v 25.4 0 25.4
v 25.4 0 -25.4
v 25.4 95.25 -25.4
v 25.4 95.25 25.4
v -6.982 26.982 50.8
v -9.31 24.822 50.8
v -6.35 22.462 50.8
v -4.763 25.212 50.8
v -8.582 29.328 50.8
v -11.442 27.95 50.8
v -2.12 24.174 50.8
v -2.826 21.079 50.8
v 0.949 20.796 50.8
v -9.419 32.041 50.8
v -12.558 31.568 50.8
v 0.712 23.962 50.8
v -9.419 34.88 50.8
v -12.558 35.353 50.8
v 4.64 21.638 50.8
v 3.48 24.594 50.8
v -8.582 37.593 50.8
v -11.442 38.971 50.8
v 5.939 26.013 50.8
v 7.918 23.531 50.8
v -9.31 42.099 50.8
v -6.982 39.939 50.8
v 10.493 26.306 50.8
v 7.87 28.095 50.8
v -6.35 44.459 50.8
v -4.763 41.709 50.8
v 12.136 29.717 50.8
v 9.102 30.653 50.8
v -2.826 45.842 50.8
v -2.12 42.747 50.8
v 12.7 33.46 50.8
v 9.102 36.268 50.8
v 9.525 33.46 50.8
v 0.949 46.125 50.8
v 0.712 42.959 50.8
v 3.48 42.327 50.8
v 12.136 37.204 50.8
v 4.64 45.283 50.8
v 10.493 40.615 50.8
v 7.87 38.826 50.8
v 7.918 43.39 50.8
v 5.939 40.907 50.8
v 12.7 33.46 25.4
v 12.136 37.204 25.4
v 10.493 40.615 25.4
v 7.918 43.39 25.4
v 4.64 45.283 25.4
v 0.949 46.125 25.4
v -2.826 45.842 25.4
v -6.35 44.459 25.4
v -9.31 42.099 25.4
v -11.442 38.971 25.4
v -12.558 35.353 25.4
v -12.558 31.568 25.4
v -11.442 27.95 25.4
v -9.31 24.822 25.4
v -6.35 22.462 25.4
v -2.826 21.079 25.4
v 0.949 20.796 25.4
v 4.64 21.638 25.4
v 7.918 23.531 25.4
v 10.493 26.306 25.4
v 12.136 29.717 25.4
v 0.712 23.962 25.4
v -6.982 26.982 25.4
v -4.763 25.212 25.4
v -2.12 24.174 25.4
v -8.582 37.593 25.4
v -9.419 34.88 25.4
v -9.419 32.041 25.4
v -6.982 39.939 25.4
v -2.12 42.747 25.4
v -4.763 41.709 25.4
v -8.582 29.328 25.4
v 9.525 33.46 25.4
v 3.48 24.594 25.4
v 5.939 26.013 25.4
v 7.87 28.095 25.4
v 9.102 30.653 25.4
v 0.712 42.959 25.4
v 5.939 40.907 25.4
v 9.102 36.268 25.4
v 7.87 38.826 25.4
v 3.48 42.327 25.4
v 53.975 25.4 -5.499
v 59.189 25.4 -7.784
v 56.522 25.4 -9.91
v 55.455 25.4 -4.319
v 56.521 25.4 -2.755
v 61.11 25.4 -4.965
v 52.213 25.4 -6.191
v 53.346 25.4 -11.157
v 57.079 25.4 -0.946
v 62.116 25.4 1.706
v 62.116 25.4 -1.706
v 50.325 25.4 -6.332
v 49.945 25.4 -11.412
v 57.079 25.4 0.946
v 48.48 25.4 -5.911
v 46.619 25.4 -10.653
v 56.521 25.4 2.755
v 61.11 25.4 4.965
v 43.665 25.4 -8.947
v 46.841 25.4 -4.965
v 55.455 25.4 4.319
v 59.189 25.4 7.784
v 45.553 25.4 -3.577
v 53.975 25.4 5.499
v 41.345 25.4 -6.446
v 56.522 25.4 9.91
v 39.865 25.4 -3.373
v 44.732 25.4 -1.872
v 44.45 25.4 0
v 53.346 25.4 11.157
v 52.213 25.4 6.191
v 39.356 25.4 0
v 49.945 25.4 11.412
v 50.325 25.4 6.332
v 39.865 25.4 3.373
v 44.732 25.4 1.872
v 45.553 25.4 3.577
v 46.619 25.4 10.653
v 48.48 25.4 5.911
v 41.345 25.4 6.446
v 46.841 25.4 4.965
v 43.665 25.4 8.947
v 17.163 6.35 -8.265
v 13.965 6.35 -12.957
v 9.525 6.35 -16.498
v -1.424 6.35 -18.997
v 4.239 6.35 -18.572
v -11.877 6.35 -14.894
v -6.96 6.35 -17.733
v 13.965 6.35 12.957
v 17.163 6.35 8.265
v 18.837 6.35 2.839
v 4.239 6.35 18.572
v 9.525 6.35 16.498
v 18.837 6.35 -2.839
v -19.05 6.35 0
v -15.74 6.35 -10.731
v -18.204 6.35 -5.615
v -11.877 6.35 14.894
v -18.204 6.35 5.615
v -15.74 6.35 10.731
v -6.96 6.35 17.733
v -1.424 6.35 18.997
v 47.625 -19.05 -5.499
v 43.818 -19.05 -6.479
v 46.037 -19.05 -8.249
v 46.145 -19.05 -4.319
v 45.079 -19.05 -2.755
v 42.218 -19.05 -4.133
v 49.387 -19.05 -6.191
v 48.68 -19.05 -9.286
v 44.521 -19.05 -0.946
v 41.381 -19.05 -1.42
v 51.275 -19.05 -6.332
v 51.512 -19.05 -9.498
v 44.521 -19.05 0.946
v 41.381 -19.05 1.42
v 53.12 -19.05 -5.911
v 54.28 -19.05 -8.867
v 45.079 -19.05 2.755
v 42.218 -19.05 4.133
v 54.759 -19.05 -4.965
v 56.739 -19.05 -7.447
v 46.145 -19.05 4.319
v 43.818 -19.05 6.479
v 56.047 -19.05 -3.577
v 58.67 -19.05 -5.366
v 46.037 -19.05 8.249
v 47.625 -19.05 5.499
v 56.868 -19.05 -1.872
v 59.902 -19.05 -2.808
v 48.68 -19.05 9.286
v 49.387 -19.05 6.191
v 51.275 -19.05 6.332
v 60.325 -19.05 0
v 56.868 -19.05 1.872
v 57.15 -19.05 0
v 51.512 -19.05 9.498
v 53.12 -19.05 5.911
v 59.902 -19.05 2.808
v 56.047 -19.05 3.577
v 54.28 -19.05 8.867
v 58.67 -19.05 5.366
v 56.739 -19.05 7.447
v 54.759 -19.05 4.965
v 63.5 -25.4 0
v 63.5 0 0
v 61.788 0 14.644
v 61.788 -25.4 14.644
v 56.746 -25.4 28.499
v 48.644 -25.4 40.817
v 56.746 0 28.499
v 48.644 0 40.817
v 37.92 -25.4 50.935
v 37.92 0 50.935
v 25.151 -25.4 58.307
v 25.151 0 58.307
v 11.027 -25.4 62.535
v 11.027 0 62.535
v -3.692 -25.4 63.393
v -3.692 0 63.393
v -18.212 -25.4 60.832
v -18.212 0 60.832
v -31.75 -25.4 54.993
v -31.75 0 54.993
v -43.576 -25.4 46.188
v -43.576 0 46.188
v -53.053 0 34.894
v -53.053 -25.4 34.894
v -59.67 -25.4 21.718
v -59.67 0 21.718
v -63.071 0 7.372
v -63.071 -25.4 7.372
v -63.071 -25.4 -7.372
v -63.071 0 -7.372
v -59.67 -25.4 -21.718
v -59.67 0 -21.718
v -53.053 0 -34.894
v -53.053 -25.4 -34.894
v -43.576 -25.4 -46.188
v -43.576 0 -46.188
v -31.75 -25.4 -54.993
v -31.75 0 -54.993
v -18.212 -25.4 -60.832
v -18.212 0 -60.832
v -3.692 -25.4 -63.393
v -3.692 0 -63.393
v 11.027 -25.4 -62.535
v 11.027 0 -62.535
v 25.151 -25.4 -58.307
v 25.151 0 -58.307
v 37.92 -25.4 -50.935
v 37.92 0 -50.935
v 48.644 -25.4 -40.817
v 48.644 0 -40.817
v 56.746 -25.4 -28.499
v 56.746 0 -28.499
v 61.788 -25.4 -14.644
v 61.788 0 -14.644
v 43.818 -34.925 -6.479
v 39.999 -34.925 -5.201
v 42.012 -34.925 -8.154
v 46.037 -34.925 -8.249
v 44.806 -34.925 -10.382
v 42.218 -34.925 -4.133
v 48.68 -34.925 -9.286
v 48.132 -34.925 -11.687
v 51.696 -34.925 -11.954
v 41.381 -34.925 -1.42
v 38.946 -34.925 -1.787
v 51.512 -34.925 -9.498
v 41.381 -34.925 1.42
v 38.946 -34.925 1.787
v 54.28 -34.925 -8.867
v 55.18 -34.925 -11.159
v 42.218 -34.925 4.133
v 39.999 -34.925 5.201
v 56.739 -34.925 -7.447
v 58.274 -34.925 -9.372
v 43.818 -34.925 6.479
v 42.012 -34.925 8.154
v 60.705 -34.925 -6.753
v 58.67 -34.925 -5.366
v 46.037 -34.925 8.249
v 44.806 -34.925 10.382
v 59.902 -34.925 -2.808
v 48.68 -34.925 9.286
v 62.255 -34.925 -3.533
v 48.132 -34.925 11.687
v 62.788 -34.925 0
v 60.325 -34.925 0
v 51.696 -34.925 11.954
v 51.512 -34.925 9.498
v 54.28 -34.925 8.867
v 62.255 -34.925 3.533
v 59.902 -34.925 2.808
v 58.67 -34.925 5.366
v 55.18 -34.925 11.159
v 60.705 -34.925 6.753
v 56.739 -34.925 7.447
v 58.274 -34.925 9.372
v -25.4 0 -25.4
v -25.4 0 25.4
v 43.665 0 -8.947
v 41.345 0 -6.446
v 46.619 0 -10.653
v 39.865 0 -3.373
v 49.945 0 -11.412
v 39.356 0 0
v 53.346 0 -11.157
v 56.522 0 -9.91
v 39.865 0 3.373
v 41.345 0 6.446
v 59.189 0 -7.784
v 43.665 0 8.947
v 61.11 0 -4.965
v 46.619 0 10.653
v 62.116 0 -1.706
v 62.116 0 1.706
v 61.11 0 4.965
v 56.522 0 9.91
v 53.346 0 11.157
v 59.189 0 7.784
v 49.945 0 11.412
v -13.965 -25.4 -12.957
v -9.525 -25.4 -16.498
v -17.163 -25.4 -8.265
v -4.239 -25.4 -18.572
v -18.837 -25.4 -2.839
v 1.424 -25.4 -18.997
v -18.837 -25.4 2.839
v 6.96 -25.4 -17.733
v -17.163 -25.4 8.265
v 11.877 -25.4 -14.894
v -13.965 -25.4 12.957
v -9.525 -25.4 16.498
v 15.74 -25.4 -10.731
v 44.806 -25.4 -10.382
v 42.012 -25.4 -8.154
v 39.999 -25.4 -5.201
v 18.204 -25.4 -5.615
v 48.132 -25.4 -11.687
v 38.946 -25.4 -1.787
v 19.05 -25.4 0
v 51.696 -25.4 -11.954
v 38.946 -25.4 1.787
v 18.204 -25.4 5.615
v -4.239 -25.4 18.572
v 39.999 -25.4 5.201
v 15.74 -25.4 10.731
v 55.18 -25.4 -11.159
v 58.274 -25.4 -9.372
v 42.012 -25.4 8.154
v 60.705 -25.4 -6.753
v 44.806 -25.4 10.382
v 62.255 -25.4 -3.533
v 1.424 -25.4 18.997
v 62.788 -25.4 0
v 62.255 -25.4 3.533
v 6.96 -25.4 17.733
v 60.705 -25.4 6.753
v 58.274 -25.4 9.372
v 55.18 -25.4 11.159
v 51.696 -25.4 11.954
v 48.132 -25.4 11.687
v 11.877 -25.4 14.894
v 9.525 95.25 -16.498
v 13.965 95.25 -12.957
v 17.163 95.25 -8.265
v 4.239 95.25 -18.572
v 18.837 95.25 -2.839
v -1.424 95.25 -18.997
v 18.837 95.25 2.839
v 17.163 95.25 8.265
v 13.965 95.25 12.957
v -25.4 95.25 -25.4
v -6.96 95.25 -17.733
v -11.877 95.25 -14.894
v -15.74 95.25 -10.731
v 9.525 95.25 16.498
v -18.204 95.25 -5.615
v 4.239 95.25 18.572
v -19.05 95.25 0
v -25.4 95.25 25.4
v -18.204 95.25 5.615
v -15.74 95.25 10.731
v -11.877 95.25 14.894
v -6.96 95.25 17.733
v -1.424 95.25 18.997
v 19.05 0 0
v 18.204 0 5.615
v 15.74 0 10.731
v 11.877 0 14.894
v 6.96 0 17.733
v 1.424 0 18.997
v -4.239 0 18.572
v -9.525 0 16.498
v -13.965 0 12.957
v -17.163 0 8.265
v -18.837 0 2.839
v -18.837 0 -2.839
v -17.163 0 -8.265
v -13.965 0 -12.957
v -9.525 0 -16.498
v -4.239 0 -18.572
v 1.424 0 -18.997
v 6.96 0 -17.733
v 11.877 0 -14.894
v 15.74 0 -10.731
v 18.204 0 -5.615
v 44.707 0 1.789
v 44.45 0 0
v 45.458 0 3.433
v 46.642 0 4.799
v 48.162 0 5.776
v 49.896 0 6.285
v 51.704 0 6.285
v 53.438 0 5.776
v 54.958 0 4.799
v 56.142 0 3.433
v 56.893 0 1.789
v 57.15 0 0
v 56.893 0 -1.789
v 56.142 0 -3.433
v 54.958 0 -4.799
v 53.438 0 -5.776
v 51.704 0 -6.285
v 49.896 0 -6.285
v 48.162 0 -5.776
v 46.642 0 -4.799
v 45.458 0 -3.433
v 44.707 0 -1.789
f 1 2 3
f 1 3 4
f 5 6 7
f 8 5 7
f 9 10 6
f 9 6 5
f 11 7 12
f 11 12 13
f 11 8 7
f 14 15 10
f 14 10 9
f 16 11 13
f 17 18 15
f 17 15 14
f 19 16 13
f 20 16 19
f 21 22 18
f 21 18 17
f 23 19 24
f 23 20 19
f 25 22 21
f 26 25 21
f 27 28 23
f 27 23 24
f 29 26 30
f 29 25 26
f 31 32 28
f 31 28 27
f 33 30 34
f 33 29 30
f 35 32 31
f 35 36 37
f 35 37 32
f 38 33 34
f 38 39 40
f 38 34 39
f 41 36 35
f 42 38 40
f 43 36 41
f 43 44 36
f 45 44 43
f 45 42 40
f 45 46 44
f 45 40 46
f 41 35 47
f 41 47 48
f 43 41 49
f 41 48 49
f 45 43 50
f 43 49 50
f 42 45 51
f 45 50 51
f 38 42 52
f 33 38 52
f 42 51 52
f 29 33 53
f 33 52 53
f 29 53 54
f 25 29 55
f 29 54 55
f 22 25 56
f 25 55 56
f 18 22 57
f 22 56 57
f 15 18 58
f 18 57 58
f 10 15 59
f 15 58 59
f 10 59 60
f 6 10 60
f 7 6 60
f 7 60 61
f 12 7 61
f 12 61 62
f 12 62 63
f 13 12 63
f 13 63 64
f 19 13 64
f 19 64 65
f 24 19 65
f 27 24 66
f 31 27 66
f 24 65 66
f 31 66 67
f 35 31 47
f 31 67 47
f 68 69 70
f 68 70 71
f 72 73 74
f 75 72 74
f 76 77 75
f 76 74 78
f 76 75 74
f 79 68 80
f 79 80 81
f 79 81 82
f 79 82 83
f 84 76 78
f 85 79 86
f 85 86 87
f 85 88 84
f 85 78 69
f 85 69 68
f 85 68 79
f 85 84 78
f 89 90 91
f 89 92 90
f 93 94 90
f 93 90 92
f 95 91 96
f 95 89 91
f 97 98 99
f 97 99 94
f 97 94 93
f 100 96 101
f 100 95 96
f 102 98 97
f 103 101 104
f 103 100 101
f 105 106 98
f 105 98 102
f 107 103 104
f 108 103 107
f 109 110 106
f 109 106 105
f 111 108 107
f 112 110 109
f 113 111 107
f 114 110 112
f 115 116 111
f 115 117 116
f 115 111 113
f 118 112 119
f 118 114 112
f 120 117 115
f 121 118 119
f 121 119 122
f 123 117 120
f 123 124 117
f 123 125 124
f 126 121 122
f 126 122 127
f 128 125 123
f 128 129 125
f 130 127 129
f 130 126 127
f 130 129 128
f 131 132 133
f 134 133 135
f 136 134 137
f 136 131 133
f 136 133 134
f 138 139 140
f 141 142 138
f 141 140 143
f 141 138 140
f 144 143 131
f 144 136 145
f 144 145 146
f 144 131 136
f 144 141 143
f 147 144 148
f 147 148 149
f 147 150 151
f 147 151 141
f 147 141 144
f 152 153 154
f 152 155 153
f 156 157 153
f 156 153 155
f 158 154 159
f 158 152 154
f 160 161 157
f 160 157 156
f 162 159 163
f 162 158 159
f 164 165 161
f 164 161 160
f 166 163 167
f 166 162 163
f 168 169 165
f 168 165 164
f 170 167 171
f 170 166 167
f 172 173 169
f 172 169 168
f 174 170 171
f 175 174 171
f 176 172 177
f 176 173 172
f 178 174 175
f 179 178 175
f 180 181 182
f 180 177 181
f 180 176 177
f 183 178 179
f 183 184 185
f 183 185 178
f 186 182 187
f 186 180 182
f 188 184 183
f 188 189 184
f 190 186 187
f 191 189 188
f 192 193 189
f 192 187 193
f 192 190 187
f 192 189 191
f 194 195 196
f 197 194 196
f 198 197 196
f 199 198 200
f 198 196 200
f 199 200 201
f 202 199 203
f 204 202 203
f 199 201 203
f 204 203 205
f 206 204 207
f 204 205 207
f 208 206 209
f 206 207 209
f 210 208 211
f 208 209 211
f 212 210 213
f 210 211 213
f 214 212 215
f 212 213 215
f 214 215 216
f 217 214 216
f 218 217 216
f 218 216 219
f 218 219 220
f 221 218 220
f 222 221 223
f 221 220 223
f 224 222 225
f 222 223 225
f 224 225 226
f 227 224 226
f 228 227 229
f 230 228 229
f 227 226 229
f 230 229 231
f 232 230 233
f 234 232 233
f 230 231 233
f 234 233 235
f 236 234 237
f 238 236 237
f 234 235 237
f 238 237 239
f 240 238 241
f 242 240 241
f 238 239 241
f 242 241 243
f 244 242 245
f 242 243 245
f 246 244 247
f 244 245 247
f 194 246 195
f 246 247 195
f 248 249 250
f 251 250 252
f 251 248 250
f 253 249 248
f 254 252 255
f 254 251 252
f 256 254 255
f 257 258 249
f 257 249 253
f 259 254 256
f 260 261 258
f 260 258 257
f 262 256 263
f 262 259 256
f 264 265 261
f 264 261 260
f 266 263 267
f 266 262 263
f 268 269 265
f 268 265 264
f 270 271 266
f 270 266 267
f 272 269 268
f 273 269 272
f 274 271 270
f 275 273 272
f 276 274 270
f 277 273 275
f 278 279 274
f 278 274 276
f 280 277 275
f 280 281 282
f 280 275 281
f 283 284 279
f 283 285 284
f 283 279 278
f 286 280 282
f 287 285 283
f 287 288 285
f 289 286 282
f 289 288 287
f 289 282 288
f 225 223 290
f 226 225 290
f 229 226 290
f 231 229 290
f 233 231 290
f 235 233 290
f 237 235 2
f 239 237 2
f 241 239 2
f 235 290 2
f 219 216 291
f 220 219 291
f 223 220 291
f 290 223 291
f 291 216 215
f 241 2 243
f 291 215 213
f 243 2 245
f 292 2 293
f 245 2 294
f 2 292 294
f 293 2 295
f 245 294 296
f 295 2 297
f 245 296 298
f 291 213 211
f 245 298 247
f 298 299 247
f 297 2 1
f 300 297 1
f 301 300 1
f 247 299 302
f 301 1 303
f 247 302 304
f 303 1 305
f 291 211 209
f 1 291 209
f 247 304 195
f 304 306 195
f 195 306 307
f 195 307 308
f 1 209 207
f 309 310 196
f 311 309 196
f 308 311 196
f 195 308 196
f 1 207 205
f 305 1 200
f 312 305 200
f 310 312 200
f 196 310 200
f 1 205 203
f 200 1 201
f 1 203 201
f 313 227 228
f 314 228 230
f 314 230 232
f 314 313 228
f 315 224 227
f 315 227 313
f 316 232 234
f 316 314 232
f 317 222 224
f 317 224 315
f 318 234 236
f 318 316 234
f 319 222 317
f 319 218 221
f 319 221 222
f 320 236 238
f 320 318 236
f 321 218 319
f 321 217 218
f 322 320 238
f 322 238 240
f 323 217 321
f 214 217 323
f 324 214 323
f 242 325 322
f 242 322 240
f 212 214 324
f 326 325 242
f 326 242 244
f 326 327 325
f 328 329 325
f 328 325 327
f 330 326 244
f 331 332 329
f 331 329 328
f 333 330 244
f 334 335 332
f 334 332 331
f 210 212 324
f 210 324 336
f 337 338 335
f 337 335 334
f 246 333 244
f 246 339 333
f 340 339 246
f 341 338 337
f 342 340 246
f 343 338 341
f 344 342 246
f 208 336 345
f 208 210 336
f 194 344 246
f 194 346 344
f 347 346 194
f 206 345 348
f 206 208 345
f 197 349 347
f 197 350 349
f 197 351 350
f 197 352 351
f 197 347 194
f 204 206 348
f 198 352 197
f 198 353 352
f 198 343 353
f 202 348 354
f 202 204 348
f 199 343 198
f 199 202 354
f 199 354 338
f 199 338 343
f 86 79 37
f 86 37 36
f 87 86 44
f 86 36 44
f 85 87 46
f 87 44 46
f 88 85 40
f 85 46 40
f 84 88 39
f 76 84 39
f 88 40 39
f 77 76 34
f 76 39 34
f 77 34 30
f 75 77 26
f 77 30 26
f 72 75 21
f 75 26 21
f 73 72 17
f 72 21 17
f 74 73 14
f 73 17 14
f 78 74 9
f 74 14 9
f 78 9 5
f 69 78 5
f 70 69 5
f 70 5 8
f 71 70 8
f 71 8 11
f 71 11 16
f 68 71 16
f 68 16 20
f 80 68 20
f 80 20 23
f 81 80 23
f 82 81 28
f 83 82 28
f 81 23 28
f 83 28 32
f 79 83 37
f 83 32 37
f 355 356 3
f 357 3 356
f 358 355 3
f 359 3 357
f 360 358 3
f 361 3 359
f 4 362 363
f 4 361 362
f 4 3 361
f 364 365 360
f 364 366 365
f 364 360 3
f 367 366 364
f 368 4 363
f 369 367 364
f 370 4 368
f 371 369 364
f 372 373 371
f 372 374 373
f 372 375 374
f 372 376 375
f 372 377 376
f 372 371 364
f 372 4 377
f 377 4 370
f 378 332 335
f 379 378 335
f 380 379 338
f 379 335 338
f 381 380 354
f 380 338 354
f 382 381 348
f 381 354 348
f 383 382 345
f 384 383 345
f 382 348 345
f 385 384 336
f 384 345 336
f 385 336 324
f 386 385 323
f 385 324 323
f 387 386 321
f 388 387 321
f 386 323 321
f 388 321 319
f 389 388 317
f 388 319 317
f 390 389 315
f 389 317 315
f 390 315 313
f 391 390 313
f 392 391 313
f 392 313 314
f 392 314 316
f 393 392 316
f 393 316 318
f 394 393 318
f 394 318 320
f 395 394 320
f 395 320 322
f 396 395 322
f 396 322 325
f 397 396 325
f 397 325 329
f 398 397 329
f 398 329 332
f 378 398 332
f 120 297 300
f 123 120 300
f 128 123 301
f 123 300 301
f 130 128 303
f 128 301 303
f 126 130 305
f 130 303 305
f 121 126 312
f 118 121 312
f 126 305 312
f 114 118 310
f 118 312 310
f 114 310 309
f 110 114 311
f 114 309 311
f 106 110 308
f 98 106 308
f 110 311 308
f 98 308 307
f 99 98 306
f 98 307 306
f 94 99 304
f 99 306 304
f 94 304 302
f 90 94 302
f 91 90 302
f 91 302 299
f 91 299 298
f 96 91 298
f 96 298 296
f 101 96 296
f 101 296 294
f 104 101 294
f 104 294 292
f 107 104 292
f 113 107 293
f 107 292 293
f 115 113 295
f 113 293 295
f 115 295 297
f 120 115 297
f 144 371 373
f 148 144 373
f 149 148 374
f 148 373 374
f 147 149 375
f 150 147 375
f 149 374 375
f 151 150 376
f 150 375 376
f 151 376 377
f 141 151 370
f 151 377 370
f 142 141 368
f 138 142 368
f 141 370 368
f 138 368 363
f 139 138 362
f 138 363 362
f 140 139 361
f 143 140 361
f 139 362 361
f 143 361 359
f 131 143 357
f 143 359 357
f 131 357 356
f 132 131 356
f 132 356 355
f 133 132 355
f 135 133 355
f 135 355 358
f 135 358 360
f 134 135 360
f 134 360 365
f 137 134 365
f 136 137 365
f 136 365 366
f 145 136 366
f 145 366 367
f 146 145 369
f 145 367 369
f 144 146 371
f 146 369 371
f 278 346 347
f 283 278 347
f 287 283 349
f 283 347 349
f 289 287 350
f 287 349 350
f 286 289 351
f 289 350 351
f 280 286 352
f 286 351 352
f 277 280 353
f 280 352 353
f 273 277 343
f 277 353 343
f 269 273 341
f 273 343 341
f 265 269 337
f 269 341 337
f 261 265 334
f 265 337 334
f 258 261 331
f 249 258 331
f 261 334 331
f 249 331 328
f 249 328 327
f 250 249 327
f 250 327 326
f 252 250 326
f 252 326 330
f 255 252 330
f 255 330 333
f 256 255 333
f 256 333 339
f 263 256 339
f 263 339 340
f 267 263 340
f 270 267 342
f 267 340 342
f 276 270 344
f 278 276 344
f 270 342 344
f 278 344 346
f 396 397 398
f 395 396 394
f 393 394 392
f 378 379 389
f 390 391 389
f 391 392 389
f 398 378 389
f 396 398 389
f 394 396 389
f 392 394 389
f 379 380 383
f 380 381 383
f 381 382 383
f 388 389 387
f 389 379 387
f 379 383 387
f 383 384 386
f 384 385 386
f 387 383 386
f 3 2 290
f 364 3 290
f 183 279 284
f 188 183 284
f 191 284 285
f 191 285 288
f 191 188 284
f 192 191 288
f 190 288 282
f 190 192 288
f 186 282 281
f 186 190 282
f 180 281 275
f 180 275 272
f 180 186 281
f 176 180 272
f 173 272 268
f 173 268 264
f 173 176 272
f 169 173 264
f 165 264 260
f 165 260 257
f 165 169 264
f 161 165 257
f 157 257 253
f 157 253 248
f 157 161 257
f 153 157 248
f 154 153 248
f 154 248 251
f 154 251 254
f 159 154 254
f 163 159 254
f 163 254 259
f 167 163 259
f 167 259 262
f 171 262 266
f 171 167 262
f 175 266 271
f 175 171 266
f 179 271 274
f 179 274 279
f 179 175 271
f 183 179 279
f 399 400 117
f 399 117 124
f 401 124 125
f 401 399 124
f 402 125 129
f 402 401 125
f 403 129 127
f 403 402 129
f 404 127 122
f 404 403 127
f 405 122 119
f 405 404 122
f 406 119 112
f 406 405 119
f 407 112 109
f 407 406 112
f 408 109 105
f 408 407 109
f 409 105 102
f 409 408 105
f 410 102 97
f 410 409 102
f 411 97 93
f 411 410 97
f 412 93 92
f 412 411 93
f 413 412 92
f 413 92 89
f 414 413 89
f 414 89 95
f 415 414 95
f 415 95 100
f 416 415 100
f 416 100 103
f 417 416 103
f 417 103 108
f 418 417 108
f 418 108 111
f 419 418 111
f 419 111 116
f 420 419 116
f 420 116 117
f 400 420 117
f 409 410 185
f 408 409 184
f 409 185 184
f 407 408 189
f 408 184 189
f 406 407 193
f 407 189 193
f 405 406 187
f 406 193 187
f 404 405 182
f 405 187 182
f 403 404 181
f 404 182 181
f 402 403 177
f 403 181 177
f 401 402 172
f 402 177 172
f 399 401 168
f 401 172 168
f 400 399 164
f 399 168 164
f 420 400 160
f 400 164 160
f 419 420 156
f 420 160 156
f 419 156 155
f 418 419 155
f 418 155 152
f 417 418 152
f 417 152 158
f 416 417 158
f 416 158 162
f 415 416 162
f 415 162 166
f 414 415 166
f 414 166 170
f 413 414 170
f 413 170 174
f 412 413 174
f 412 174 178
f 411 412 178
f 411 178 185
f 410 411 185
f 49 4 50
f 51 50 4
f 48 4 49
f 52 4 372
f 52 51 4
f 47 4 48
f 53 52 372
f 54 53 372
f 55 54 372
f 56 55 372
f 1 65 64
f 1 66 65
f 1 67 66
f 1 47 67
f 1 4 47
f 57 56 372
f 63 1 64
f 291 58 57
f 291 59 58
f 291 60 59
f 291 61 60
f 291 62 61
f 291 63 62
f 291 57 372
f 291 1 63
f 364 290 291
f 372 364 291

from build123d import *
from build123d import SkipClean  # not in build123d's __all__

# Parameters (mm, degrees)
F0_R      = 63.5
F1_DEPTH  = 25.4
F2_R      = 19.05
F3_DEPTH  = 25.401
F4_R      = 6.35
F5_DEPTH  = 25.4
F6_R      = 9.525
F7_DEPTH  = 6.35
F8_W      = 50.8
F8_H      = 50.8
F9_DEPTH  = 95.25
F10_R     = 19.05
F11_DEPTH = 88.9
F12_R     = 11.4435821265
F12_R_2   = 8.6754099319
F12_R_3   = 6.35
F13_DEPTH = 25.4
F14_R     = 12.7
F15_DEPTH = 25.4
F16_R     = 9.525
F17_DEPTH = 25.4
F18_R     = 11.9876896331
F18_R_2   = 9.525
F19_DEPTH = 9.525


# Not quite as in the source:
# - after a boolean that leaves OpenCascade's solid faulty, fix() repairs it


with BuildPart() as f1:
    # F0 (on Front) → F1 (new body)
    with BuildSketch(Plane.XZ):
        Circle(F0_R)
    extrude(amount=F1_DEPTH)

    # F2 (on face) → F3 (cut, through all)
    with BuildSketch(Plane.XZ.offset(25.4)):
        Circle(F2_R)
    extrude(amount=-F3_DEPTH, mode=Mode.SUBTRACT)

    # F4 (on face) → F5 (cut)
    with BuildSketch(Plane.XZ.offset(25.4)):
        with Locations((50.8, 0)):
            Circle(F4_R)
    extrude(amount=-F5_DEPTH, mode=Mode.SUBTRACT)

    # F6 (on face) → F7 (cut)
    with BuildSketch(Plane.XZ.offset(25.4)):
        with Locations((50.8, 0)):
            Circle(F6_R)
    extrude(amount=-F7_DEPTH, mode=Mode.SUBTRACT)

    # F8 (on face) → F9 (join)
    with BuildSketch(Plane(origin=(0, 0, 0), x_dir=(-1, 0, 0), z_dir=(0, 1, 0))):
        Rectangle(F8_W, F8_H)
    extrude(amount=F9_DEPTH)

    # F10 (on face) → F11 (cut)
    with BuildSketch(Plane(origin=(0, 95.25, 0), x_dir=(-1, 0, 0), z_dir=(0, 1, 0))):
        Circle(F10_R)
    extrude(amount=-F11_DEPTH, mode=Mode.SUBTRACT)

    # F12 (on face) → F13 (join)
    with BuildSketch(Plane(origin=(0, 0, 0), x_dir=(-1, 0, 0), z_dir=(0, 1, 0))):
        with Locations((-50.8, 0)):
            Circle(F12_R)
        with Locations((-50.8, 0)):
            Circle(F12_R_2, mode=Mode.SUBTRACT)
        with Locations((-50.8, 0)):
            Circle(F12_R_2)
        with Locations((-50.8, 0)):
            Circle(F12_R_3, mode=Mode.SUBTRACT)
    with SkipClean():  # cleaning this boolean's faces spoils the solid; the shape is the same uncleaned
        extrude(amount=F13_DEPTH)

    # F14 (on face) → F15 (join)
    with BuildSketch(Plane.XY.offset(25.4)):
        with Locations((0, 33.4604047239)):
            Circle(F14_R)
    extrude(amount=F15_DEPTH)

    add(f1.part.fix(), mode=Mode.REPLACE)

    # F16 (on face) → F17 (cut)
    with BuildSketch(Plane.XY.offset(50.8)):
        with Locations((0, 33.4604047239)):
            Circle(F16_R)
    extrude(amount=-F17_DEPTH, mode=Mode.SUBTRACT)

    add(f1.part.fix(), mode=Mode.REPLACE)

    # F18 (on face) → F19 (join)
    with BuildSketch(Plane.XZ.offset(25.4)):
        with Locations((50.8, 0)):
            Circle(F18_R)
        with Locations((50.8, 0)):
            Circle(F18_R_2, mode=Mode.SUBTRACT)
    extrude(amount=F19_DEPTH)


solid = f1.part
